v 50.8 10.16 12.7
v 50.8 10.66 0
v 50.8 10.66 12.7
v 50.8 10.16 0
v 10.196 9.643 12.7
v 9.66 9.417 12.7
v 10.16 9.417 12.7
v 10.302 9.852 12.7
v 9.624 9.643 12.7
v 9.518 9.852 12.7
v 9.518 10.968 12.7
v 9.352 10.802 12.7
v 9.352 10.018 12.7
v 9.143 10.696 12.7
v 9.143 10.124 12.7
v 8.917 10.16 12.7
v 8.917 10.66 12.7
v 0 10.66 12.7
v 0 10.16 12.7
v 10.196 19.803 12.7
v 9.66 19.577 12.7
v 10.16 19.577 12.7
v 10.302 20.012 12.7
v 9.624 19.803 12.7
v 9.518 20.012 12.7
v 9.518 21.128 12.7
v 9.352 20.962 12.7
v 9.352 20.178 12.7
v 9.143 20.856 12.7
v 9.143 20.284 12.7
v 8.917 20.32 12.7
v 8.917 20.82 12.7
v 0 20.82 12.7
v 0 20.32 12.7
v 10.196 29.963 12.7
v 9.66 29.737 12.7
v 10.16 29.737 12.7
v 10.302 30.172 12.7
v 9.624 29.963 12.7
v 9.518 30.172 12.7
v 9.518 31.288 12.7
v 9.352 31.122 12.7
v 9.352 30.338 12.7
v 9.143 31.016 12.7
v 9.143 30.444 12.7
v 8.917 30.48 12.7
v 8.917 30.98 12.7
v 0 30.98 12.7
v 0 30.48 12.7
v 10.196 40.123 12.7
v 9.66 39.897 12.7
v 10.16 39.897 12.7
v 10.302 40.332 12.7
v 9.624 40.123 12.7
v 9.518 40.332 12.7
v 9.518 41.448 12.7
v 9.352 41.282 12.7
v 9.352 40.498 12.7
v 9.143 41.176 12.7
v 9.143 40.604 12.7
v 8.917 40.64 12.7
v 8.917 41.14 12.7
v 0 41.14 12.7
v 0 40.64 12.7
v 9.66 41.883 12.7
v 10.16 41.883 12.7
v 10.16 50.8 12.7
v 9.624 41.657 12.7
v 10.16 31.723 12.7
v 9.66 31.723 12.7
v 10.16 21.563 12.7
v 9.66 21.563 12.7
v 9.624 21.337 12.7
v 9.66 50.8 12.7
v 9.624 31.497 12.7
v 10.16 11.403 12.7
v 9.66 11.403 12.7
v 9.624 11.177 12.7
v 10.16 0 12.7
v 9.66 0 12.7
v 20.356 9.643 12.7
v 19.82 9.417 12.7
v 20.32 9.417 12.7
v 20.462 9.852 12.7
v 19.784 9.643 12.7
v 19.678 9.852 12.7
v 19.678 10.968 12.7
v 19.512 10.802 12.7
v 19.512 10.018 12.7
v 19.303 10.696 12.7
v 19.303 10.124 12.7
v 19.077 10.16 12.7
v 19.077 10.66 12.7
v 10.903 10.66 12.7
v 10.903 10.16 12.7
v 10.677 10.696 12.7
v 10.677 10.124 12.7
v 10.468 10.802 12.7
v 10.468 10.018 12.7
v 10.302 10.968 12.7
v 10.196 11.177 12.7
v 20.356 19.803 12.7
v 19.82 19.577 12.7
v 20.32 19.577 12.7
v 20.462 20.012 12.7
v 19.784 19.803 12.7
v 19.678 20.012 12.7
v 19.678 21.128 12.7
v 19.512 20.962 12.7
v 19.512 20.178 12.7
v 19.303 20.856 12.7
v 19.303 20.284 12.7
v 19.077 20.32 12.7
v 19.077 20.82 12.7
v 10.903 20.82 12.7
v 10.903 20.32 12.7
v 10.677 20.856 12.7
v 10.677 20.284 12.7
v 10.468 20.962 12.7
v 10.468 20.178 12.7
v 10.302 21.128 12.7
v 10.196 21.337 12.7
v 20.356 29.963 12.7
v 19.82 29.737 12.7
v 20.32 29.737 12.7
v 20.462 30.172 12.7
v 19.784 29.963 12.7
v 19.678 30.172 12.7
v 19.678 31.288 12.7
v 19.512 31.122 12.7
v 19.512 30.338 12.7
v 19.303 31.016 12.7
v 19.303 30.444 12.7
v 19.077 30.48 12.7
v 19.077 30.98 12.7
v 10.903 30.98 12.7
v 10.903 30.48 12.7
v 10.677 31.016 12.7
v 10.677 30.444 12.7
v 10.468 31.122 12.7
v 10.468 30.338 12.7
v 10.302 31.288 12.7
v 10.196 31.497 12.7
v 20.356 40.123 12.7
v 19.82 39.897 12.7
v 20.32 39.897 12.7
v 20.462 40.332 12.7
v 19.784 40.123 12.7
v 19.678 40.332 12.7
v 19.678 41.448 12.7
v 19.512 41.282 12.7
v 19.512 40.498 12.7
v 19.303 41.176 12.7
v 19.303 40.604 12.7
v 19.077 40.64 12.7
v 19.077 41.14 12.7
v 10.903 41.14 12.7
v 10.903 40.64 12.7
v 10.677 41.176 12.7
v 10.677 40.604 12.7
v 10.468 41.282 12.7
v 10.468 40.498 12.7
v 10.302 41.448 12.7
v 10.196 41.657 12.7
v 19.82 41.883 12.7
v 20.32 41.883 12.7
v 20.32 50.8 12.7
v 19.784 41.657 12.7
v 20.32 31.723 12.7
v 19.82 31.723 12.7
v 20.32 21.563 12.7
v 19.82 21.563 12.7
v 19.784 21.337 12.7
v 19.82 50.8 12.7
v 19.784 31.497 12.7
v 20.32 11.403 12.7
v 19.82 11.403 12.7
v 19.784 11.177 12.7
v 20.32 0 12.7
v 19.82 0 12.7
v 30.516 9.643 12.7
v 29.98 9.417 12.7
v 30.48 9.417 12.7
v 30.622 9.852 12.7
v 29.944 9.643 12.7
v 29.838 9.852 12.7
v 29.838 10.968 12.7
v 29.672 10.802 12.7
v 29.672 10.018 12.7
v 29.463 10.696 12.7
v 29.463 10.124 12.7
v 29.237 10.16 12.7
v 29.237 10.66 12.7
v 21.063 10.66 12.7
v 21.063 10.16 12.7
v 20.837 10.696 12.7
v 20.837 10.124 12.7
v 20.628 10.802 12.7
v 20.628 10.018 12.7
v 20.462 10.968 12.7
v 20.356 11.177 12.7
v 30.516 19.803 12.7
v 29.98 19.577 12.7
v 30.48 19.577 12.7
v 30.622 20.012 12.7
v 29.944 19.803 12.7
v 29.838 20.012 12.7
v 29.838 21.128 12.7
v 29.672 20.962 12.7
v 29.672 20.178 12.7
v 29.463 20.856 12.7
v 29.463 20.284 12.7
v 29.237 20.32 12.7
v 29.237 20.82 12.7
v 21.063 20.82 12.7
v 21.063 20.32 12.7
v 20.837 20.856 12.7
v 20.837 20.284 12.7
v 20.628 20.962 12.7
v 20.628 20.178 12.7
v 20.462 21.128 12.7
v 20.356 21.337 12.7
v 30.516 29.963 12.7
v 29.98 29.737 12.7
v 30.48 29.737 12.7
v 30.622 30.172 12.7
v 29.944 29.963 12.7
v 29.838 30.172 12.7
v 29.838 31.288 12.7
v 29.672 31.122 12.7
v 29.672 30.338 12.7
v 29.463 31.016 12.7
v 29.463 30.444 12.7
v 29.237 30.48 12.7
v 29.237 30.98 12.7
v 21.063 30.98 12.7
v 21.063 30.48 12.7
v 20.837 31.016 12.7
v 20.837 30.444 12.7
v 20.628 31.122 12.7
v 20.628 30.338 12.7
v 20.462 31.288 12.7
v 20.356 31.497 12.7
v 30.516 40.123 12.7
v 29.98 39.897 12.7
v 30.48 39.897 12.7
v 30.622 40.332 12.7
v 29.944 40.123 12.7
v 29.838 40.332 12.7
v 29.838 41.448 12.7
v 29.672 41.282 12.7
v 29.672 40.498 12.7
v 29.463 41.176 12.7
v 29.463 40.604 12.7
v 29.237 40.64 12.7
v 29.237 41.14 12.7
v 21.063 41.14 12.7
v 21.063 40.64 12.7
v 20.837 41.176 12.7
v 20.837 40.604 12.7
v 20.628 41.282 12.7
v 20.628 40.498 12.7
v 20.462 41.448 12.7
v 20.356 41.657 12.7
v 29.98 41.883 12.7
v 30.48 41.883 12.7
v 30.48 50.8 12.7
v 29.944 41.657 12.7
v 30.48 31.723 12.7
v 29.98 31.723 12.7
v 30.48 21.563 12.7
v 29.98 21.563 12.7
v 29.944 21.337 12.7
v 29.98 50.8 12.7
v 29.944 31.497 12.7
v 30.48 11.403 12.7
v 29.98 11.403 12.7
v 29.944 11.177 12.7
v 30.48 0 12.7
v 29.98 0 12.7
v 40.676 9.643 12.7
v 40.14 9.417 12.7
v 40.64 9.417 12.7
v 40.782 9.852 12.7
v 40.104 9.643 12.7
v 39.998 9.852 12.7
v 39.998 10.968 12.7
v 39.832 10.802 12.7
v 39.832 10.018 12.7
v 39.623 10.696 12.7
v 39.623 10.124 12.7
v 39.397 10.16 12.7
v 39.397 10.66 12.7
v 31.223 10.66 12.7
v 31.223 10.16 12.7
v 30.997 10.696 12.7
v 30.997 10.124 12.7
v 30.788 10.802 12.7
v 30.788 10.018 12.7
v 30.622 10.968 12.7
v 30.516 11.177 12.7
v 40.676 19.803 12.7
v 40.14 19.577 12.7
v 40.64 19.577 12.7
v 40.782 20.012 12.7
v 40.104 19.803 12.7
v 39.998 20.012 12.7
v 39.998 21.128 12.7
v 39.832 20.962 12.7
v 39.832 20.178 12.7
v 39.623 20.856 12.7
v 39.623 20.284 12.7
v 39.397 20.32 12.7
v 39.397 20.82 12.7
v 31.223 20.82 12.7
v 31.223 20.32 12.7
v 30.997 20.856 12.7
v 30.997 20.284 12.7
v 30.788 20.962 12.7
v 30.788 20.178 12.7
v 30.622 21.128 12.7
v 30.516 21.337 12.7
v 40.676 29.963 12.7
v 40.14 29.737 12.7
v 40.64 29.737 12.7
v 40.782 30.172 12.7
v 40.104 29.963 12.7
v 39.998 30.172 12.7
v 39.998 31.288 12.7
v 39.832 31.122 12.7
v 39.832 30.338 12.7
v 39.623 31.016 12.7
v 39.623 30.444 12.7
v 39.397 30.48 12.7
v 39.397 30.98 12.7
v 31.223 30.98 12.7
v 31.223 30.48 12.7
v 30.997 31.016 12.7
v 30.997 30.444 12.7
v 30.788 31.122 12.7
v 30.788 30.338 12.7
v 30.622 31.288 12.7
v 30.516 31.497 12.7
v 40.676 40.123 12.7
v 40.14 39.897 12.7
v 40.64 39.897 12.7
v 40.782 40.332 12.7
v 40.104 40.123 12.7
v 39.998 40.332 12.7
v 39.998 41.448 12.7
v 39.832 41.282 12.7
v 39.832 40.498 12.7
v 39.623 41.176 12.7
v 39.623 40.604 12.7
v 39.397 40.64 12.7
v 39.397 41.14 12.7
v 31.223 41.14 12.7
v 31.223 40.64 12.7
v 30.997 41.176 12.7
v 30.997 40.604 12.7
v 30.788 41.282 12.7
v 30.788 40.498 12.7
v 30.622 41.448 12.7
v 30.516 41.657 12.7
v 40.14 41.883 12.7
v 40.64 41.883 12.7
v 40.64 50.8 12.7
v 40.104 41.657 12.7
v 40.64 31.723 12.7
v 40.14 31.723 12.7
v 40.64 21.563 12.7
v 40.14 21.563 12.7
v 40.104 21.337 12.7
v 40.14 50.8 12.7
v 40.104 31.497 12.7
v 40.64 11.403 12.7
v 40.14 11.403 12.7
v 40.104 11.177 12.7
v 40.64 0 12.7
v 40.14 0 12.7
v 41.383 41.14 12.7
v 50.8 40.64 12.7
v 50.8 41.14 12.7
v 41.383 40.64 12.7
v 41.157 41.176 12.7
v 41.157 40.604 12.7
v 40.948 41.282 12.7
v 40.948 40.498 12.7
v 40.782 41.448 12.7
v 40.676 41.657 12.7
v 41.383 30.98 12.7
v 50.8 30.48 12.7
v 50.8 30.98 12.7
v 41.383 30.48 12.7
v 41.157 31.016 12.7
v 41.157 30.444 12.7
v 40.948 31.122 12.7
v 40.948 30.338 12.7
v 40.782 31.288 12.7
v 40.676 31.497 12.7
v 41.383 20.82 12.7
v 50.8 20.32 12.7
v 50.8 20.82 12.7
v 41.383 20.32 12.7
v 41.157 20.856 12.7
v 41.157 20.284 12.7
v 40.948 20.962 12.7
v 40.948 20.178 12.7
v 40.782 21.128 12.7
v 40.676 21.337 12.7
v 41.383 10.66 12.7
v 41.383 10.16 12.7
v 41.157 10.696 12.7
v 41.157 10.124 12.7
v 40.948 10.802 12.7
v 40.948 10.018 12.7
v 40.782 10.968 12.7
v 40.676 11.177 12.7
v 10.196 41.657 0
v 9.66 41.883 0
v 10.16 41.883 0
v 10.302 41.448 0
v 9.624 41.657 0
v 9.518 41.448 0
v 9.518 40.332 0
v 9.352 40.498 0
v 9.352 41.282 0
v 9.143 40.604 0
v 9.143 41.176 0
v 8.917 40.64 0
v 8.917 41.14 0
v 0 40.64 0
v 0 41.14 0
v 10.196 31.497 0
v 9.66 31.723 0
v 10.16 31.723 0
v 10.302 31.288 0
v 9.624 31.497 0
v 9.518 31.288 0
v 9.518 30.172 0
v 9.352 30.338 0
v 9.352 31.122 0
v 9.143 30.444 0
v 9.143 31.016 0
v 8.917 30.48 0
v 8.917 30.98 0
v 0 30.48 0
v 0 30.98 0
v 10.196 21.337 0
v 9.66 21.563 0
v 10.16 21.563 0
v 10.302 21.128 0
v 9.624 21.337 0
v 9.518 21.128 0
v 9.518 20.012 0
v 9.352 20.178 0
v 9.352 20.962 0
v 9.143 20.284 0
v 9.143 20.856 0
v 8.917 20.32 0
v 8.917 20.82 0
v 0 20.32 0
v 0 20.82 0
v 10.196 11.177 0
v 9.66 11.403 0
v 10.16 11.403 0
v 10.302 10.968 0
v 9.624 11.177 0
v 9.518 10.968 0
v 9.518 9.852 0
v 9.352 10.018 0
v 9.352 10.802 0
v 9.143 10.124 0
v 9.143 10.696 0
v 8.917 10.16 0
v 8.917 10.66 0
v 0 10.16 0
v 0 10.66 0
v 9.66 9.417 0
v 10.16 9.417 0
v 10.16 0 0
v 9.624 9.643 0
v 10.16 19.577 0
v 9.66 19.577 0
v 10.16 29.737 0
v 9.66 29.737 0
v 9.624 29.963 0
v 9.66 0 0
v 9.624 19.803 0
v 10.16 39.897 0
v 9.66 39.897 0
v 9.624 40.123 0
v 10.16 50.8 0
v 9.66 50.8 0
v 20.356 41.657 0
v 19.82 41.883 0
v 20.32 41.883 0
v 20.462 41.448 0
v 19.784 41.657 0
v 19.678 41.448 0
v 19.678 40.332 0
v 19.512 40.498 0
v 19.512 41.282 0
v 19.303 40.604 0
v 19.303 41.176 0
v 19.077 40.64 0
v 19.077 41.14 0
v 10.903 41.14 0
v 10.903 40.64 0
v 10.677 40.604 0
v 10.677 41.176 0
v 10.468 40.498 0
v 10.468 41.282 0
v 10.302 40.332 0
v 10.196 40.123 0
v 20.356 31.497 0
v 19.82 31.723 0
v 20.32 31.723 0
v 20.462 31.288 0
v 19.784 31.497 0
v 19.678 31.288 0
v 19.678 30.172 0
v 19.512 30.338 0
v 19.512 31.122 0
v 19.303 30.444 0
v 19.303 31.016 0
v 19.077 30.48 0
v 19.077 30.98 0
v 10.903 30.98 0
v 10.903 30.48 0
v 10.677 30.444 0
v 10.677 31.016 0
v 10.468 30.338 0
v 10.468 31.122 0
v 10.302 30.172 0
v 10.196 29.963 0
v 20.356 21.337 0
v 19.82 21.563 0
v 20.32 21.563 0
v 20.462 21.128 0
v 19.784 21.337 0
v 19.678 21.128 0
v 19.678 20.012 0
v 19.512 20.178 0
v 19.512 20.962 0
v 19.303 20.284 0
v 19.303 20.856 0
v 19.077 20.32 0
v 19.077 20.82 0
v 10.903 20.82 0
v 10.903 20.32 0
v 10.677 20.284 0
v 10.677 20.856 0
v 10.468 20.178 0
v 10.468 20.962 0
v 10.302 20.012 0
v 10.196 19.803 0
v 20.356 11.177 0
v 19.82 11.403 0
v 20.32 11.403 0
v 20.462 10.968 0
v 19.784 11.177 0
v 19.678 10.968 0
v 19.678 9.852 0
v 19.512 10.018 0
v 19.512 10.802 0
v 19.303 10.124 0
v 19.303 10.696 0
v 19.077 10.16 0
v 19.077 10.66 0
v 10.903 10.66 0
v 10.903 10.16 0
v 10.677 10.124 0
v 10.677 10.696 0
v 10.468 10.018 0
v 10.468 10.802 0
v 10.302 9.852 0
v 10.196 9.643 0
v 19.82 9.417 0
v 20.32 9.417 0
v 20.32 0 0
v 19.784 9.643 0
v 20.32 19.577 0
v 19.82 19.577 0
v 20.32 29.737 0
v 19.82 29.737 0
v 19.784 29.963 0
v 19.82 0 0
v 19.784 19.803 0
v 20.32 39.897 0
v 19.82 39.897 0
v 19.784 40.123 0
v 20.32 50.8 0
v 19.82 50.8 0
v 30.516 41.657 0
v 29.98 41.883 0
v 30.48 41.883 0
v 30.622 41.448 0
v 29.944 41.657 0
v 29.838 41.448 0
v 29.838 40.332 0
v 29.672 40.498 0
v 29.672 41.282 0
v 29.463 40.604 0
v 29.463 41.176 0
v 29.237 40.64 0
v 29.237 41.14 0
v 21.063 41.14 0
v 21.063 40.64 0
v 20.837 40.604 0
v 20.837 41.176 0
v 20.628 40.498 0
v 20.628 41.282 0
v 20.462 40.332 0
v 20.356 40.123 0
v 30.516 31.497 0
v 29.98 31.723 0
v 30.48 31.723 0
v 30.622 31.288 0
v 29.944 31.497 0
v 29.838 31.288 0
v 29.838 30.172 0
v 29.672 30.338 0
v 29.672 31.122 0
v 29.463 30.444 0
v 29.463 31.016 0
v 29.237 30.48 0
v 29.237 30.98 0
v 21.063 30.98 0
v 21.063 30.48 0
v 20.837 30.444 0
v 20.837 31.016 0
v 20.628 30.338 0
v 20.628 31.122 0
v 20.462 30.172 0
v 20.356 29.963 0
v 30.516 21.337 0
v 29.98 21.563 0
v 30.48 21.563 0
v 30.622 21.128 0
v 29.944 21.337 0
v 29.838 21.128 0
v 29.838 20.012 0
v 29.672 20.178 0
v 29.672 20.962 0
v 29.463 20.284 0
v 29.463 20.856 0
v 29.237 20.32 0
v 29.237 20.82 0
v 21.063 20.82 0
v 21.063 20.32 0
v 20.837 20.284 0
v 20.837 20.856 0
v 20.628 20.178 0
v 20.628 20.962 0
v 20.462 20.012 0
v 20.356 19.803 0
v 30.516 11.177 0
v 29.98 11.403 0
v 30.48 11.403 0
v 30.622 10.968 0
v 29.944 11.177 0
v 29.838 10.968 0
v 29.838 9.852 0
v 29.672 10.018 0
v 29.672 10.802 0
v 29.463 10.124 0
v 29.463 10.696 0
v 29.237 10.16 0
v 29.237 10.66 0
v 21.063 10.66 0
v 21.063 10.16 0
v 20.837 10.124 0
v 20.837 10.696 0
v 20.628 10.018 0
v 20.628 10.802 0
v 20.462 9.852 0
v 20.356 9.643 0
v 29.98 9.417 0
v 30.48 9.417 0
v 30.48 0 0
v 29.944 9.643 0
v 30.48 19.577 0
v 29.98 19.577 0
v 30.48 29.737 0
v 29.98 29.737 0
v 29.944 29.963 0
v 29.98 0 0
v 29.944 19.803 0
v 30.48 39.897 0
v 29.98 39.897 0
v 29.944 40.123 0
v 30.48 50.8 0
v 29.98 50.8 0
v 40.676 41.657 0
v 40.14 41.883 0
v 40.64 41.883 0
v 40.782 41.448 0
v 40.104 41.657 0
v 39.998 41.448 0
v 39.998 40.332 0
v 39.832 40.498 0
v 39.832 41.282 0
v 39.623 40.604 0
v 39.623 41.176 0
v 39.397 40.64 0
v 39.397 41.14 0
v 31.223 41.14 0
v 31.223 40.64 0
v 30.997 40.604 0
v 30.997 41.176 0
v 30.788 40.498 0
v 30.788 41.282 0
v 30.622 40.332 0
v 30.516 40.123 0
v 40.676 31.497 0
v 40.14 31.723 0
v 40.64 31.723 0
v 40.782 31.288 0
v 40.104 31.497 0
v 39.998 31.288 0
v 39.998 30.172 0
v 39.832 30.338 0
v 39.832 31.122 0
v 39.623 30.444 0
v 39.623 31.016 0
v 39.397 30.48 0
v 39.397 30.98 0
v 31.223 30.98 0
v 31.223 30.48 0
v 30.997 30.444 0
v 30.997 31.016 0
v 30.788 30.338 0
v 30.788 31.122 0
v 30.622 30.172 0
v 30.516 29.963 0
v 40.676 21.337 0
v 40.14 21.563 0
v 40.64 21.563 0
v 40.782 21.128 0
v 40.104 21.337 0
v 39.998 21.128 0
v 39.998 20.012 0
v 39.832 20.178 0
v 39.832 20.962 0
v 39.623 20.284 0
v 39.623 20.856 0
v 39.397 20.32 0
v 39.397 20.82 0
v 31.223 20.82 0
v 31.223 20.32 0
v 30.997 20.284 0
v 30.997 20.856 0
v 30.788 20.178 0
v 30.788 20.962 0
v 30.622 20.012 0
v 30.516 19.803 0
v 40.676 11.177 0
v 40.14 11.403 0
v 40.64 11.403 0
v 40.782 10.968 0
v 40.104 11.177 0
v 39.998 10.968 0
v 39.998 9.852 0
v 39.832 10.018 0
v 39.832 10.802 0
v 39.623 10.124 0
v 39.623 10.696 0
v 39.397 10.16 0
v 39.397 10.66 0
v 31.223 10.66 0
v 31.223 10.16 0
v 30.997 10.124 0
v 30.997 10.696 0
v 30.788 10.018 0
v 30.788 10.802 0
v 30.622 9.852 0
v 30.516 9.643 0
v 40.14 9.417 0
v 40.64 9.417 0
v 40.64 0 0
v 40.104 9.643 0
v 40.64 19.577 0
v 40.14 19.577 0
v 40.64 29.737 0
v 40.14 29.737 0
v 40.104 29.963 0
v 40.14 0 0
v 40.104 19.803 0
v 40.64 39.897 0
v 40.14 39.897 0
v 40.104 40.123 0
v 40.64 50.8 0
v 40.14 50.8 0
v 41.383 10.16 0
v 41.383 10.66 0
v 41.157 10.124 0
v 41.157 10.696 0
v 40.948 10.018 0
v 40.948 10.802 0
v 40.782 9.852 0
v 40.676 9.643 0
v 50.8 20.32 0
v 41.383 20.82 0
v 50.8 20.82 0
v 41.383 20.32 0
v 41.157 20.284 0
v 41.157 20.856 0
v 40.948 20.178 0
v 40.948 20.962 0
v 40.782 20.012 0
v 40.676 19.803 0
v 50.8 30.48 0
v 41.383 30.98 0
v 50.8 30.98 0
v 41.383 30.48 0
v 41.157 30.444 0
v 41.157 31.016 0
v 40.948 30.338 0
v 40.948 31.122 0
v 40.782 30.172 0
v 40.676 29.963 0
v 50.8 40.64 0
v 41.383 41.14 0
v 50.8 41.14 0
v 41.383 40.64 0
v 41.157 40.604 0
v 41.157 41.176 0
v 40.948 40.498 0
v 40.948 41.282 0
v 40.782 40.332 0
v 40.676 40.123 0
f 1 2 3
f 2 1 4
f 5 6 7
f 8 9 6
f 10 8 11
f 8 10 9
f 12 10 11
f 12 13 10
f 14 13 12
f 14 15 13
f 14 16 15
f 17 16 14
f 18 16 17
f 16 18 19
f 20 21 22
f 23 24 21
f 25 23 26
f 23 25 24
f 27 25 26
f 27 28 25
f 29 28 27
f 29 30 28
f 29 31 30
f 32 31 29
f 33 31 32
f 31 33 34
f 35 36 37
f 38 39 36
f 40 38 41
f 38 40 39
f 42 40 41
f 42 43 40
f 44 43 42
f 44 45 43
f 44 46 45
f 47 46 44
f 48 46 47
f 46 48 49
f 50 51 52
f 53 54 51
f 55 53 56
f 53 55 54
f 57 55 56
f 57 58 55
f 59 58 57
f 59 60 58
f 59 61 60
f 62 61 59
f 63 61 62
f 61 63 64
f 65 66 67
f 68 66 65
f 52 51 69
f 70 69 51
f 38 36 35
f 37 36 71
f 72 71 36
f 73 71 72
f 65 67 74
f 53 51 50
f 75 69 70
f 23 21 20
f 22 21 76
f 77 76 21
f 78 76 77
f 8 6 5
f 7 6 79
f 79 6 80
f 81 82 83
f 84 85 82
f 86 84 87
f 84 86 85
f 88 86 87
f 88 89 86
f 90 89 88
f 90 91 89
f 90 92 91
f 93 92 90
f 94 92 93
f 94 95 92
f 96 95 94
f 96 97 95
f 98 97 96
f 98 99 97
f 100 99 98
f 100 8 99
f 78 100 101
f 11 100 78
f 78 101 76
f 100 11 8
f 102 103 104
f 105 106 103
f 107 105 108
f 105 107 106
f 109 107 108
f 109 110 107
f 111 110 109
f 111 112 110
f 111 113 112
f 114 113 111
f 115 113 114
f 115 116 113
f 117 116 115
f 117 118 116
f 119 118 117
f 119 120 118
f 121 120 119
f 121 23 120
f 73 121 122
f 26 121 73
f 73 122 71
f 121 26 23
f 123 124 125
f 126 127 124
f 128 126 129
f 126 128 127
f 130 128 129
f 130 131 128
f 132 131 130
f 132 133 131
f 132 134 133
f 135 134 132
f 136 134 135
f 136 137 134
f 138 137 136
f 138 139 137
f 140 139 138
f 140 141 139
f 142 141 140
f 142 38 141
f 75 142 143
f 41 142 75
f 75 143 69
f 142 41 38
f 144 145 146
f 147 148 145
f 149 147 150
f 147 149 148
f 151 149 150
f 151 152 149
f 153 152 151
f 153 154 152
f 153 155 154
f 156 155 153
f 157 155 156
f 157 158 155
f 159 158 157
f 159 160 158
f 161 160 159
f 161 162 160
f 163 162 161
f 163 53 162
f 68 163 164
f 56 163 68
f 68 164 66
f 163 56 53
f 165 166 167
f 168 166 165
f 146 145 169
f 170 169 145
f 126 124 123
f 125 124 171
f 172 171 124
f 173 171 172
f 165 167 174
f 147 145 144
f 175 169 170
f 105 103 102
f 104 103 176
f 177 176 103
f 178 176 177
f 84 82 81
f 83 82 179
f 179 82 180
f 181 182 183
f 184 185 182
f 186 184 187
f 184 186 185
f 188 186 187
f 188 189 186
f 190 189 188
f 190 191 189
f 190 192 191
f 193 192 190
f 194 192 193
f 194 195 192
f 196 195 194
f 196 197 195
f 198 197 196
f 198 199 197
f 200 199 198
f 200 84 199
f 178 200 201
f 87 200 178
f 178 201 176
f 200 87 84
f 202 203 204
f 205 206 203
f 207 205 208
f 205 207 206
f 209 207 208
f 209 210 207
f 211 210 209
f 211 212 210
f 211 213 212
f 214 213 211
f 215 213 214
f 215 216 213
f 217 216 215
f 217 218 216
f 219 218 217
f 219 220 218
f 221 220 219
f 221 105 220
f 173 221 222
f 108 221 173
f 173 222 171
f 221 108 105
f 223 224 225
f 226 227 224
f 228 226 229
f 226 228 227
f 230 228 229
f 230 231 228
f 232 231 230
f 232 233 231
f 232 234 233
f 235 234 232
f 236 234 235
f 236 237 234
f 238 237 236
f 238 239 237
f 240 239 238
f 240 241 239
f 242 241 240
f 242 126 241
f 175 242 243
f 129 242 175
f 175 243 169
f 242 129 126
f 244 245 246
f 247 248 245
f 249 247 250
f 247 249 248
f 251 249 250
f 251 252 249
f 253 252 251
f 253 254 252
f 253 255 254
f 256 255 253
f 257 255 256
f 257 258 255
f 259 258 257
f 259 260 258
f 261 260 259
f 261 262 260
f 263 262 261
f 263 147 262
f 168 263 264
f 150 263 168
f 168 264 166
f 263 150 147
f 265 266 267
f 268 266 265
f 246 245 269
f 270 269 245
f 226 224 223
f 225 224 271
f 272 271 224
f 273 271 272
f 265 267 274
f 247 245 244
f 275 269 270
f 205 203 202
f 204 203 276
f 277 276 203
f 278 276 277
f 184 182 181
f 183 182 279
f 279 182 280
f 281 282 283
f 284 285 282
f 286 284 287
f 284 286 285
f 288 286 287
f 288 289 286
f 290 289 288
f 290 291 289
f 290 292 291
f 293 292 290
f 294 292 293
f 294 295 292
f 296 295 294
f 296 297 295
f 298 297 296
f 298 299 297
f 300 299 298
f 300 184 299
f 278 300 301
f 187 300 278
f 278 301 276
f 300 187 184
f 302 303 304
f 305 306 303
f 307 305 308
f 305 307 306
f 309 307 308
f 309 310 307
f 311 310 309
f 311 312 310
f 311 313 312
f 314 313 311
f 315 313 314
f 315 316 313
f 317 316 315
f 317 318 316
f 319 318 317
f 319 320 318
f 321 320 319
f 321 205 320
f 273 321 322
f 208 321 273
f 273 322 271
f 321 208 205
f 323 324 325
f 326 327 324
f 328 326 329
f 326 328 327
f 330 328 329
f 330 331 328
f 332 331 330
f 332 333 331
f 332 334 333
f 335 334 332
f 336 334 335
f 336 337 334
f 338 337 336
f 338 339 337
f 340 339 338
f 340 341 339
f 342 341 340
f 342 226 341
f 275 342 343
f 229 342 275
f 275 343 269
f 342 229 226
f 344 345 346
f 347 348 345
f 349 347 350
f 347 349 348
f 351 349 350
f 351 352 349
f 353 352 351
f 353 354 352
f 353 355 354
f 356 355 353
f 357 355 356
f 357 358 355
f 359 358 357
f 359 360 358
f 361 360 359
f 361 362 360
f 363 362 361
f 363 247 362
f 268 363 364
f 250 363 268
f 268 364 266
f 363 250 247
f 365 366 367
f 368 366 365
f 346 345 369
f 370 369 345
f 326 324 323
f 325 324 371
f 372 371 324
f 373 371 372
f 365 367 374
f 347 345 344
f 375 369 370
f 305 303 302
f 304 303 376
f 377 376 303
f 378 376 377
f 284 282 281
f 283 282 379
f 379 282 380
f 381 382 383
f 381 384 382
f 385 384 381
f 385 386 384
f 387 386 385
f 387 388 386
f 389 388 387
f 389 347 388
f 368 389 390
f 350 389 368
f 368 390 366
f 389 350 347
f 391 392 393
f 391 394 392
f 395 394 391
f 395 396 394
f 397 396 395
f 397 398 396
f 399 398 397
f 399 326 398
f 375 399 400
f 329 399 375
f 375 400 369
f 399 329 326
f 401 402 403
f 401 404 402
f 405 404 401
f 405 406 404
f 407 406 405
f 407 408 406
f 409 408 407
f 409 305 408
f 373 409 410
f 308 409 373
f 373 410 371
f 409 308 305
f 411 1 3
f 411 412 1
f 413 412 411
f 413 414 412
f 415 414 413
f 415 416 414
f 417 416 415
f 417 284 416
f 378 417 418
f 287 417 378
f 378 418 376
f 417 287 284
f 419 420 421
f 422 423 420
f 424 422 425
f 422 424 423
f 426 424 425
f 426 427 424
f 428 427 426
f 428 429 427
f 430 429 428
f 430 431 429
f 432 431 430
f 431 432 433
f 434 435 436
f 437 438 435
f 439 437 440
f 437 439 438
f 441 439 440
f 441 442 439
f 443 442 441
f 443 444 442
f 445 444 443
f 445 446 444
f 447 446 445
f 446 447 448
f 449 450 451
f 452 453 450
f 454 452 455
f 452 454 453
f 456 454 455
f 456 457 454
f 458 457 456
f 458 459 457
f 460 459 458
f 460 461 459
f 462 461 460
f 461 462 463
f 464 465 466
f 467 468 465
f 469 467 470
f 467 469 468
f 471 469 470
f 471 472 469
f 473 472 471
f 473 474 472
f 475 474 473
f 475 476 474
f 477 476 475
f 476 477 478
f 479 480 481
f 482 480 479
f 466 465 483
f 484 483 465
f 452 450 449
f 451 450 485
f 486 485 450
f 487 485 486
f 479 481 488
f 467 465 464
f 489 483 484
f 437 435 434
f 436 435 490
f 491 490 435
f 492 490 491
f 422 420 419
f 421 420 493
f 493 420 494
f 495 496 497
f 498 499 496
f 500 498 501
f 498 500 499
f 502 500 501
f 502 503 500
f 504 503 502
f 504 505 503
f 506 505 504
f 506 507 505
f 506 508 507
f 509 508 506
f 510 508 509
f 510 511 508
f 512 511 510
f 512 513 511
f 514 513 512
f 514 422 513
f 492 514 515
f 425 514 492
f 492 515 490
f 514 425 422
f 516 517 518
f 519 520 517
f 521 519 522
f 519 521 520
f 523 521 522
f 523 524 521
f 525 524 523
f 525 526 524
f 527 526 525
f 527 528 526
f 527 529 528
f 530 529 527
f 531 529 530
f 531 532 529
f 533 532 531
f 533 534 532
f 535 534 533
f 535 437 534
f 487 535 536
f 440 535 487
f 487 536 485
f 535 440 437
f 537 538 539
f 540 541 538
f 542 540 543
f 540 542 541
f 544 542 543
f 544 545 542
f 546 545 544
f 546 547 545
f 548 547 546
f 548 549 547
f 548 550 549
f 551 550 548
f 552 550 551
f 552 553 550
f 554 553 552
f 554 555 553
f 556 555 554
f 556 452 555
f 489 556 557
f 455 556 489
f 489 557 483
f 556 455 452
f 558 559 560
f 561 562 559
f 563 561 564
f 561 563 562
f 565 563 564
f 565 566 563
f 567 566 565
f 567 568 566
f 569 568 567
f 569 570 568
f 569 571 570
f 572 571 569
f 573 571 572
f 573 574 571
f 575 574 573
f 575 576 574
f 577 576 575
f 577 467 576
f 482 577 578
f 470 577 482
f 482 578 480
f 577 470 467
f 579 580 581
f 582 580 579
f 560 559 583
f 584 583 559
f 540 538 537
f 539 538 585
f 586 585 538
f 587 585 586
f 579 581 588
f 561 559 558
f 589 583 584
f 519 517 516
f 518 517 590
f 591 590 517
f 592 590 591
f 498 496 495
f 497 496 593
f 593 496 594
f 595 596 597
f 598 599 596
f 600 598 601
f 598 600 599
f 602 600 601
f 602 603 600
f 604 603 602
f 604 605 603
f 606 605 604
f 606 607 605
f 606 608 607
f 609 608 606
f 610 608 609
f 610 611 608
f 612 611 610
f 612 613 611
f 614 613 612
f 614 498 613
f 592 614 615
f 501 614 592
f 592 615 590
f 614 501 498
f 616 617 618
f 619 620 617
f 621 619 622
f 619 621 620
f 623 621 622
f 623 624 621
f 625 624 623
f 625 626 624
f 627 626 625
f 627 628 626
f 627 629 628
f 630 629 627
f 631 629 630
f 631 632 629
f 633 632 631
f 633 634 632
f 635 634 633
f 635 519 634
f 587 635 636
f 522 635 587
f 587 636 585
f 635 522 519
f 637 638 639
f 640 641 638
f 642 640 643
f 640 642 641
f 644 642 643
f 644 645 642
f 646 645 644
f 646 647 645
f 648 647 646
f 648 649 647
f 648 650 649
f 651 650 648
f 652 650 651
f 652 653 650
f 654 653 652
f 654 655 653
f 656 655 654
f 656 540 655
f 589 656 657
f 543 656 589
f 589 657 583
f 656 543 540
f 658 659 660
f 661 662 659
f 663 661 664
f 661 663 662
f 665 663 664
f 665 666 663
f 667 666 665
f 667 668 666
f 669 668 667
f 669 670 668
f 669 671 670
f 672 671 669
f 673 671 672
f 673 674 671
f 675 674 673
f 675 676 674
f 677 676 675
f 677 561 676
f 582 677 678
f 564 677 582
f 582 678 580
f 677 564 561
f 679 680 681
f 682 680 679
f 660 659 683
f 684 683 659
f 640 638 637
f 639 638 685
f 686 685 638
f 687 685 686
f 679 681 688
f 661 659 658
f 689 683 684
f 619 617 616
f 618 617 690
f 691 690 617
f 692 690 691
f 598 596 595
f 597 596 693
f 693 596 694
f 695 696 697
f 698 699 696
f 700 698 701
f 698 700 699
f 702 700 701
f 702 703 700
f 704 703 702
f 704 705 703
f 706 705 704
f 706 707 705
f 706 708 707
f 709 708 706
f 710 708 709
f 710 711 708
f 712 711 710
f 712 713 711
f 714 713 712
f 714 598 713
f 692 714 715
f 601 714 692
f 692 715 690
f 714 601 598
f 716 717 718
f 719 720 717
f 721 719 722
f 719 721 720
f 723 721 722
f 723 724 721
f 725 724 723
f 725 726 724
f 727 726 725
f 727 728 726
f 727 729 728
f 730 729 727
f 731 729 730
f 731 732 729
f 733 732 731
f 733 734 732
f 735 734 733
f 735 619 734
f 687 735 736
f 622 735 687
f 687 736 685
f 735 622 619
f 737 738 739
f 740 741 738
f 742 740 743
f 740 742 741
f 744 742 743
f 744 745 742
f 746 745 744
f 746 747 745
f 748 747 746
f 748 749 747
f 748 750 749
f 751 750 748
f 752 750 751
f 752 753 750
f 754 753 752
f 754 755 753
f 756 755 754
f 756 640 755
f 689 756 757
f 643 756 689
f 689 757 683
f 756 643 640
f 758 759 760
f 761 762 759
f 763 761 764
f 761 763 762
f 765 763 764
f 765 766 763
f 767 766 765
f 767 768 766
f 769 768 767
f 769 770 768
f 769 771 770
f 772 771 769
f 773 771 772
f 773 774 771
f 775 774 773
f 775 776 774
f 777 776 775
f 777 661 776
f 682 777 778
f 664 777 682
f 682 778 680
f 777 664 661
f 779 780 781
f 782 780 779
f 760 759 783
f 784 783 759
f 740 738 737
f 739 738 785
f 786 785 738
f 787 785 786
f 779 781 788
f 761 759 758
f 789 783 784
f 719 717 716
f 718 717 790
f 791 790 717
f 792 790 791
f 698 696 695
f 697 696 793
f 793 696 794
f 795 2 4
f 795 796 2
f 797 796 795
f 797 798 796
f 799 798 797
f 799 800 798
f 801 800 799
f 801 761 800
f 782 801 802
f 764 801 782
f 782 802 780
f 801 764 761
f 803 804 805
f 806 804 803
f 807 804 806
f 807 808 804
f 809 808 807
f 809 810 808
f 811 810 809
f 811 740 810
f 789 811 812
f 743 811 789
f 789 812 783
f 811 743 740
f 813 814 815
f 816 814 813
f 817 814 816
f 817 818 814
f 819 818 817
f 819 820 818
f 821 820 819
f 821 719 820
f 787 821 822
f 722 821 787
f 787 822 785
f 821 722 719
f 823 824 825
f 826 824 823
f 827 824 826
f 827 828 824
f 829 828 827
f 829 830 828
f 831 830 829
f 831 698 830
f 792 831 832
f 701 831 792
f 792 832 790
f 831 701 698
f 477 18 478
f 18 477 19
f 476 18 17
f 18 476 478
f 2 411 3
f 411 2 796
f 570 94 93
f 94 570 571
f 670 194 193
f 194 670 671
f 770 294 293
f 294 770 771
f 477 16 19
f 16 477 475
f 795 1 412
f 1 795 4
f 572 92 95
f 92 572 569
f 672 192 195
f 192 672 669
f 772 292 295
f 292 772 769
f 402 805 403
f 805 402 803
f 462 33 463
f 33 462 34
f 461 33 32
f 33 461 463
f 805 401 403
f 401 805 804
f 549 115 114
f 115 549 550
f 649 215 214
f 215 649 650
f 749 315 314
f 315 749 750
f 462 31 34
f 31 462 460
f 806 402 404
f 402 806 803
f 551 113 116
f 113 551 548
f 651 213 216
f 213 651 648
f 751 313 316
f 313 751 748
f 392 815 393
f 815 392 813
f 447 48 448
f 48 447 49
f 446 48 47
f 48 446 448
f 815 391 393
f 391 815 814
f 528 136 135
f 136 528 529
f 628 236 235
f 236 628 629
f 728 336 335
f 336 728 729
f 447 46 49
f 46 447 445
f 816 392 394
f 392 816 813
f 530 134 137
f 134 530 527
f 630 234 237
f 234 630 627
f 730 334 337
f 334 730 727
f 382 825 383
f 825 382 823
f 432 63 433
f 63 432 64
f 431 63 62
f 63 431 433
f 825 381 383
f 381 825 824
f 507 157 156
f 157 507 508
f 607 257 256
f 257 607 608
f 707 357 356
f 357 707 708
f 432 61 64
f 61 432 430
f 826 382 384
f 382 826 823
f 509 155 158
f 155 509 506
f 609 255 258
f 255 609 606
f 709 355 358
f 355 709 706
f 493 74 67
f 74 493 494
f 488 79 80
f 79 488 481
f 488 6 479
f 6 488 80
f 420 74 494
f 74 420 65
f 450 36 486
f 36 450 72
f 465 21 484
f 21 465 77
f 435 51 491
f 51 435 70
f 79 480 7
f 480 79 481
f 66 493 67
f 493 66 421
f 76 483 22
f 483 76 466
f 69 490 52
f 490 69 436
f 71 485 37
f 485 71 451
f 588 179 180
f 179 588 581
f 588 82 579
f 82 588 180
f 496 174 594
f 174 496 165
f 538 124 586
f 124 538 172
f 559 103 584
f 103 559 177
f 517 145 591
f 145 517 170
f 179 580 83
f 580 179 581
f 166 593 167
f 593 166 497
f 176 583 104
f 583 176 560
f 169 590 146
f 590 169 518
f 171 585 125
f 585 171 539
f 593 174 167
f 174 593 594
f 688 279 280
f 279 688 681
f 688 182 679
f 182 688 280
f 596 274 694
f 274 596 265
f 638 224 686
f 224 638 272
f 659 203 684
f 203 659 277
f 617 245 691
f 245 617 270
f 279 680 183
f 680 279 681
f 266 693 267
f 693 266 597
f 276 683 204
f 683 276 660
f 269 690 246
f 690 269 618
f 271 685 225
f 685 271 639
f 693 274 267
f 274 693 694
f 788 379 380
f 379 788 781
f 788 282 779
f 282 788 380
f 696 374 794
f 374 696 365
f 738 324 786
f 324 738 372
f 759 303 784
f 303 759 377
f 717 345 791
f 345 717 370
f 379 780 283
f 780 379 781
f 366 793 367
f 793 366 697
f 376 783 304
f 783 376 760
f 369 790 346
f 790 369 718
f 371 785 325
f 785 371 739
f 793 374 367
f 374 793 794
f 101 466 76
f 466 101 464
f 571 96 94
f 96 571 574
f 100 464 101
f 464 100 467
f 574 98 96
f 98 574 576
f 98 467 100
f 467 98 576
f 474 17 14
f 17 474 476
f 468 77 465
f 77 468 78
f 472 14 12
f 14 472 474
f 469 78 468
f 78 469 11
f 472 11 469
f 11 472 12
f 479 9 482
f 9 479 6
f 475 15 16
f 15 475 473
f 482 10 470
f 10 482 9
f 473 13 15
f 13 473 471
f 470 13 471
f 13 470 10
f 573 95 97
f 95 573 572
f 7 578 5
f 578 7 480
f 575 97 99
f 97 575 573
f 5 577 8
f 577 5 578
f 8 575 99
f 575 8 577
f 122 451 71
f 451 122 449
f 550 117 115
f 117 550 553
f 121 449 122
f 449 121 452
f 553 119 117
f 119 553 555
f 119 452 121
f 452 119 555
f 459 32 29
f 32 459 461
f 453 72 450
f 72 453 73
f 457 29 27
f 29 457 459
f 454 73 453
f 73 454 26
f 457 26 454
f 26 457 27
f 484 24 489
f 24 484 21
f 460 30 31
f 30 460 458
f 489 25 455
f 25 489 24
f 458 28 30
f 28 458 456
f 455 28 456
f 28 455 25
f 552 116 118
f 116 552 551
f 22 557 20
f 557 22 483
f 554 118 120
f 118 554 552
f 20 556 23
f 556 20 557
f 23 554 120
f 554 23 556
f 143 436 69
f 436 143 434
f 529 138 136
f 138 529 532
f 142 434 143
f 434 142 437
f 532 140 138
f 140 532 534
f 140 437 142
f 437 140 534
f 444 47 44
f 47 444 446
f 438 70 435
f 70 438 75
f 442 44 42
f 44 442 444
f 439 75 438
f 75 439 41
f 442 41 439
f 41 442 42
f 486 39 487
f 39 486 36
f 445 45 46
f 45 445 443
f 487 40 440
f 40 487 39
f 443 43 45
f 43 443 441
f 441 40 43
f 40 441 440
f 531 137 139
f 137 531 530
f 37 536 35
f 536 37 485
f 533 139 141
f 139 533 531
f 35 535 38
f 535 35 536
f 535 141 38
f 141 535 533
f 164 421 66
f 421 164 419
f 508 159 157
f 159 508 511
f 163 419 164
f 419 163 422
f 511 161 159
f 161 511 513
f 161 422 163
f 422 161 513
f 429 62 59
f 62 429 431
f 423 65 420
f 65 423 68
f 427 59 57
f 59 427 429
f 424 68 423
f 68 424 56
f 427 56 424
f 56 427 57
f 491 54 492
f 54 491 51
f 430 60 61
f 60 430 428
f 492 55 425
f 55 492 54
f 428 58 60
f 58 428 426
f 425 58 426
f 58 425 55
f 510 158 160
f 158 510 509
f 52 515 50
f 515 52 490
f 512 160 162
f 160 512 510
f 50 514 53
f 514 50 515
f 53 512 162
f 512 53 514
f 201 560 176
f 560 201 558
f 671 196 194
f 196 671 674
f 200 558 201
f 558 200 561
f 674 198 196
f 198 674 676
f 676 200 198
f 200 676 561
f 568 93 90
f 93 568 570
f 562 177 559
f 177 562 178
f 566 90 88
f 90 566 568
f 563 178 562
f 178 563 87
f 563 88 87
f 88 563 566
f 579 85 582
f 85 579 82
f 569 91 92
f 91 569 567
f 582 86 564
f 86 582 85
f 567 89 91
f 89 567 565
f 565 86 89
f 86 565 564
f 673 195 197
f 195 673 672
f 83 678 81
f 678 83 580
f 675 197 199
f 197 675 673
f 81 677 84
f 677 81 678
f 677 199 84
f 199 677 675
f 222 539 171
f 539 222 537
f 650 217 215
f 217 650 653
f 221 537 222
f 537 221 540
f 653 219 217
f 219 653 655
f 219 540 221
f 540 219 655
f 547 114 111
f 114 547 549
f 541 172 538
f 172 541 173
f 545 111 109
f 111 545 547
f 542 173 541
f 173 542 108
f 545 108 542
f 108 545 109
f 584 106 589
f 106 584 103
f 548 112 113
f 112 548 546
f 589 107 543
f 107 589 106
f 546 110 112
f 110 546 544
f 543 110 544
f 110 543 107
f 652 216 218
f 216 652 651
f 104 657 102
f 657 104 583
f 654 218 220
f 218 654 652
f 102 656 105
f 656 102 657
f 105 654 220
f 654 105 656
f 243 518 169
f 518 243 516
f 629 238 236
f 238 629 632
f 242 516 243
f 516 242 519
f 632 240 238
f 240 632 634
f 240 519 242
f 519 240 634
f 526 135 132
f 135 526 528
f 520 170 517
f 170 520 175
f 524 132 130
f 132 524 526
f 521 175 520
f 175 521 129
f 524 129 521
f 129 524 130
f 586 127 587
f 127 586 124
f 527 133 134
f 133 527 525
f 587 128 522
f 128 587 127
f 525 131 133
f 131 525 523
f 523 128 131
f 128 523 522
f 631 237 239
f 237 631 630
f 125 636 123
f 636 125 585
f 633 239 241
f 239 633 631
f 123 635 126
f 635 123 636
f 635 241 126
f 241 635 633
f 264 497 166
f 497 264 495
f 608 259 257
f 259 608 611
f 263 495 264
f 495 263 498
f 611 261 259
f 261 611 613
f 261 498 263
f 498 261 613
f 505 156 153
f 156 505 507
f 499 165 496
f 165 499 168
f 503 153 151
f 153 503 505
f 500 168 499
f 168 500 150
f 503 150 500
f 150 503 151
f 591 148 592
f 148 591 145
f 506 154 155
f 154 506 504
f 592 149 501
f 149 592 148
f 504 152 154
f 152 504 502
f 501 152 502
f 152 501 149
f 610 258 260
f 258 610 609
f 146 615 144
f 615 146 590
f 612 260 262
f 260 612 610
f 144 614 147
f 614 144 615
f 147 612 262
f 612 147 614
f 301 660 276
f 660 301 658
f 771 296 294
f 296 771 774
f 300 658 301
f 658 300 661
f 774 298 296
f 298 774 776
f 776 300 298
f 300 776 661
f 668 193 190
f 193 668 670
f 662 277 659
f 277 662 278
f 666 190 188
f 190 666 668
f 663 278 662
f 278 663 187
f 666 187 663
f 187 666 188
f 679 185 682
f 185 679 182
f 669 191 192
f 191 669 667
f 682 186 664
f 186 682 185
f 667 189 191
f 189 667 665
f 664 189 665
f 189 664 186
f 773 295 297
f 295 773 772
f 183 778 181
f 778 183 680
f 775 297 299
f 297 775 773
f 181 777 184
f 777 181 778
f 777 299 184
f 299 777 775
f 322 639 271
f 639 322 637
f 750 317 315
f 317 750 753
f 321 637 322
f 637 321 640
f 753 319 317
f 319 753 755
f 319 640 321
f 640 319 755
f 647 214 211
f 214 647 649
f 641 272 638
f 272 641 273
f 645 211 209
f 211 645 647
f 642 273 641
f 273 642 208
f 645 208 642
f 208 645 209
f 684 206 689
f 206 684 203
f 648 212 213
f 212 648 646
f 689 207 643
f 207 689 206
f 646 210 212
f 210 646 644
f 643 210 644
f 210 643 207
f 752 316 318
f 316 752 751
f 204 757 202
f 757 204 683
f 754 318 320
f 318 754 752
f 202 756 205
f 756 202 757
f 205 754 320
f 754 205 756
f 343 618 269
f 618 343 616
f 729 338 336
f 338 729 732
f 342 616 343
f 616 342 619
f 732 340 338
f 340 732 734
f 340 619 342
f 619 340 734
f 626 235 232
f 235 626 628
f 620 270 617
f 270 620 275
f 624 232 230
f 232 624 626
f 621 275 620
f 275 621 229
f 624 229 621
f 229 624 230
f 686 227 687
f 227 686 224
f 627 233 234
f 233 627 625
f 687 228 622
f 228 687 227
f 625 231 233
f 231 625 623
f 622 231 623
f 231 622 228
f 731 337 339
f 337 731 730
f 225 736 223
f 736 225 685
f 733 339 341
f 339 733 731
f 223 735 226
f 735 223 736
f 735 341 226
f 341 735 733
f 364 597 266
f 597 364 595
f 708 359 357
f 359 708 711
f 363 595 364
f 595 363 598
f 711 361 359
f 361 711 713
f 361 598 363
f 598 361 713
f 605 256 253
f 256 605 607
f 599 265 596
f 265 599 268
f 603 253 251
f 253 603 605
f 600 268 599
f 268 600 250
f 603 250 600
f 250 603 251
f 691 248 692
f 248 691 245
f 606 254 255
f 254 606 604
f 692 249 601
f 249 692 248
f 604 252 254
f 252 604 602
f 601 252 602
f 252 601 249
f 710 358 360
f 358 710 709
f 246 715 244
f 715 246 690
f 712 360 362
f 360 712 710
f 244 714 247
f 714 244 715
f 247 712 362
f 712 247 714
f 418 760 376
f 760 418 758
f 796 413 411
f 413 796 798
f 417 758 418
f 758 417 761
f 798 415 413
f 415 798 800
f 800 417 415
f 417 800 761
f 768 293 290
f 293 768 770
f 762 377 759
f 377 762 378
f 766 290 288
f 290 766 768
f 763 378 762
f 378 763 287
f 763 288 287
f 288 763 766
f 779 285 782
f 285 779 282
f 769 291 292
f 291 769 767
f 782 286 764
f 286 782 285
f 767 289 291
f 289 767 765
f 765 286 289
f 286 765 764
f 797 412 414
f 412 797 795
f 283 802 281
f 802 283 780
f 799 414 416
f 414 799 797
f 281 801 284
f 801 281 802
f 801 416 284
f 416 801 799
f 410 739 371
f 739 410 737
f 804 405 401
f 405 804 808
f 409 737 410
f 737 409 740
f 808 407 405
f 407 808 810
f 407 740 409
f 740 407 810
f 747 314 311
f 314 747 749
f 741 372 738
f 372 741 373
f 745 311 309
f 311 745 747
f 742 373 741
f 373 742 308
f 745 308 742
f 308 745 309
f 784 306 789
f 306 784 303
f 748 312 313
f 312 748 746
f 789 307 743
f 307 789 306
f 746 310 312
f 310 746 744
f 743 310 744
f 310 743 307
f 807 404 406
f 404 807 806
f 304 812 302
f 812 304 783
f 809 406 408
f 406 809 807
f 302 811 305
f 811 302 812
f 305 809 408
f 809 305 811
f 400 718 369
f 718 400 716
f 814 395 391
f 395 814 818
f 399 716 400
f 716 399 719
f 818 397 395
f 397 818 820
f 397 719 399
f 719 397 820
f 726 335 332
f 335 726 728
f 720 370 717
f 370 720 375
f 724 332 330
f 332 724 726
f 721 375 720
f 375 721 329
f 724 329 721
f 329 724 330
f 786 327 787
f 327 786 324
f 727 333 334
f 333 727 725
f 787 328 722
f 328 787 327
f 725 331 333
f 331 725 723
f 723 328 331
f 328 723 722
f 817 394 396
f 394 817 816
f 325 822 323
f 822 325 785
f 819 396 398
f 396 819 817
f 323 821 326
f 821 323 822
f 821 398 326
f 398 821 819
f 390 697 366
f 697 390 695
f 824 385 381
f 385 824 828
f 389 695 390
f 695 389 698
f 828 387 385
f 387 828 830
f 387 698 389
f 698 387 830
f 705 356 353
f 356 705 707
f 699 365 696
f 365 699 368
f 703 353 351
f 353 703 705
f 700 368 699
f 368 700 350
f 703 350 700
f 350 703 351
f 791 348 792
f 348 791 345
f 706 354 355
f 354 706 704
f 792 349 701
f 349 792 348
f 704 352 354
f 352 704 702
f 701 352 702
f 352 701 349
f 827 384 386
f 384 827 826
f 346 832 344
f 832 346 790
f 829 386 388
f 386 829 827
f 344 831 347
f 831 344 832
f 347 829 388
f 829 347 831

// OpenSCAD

height=12.7;				//divider height
width=50.8;			//container width
depth=50.8;			//container depth
row_dividers=4;		//# row dividers
column_dividers=4;	//# column dividers
fillet_diam=1.5;	   //fillet diameter 
wall_thickness=0.5;		//wall thickness

ff=0.001*1;				//fudge factor to create a closed manifold



union()
{

//// Dividers

	for(j = [0:row_dividers - 1])
	{
		translate([0,(depth/(row_dividers+1))+j*(depth/(row_dividers+1)),0]) cube([width,wall_thickness,height]);
	}

	for(k = [0:column_dividers - 1])
	{
		rotate([0,0,90]) translate([0,-(width/(column_dividers+1))-k*(width/(column_dividers+1)),0]) cube([depth,wall_thickness,height]);
	}

//// Fillets

	for(m = [0:column_dividers - 1])
	{
		for(n = [0:row_dividers - 1])
		{
			//// Upper right fillet
			translate([(width/(column_dividers+1))+m*(width/(column_dividers+1))-ff,(depth/(row_dividers+1))+n*(depth/(row_dividers+1))+wall_thickness-ff,0]) fillet();

			//// Upper left fillet
			translate([(width/(column_dividers+1))+m*(width/(column_dividers+1))-wall_thickness+ff,(depth/(row_dividers+1))+n*(depth/(row_dividers+1))+wall_thickness-ff,0]) rotate([0,0,90]) fillet();

			//// Lower left fillet
			translate([(width/(column_dividers+1))+m*(width/(column_dividers+1))-wall_thickness+ff,(depth/(row_dividers+1))+n*(depth/(row_dividers+1))+ff,0]) rotate([0,0,180]) fillet();

			//// Lower right fillet
			translate([(width/(column_dividers+1))+m*(width/(column_dividers+1))-ff,(depth/(row_dividers+1))+n*(depth/(row_dividers+1))+ff,0]) rotate([0,0,270]) fillet();

		}
	}

};



//////////// module definitions ///////////////////////

module fillet() 
{
	difference()
	{
		cube([fillet_diam/2,fillet_diam/2,height]);
		translate([fillet_diam/2,fillet_diam/2,0]) cylinder(h=(height+1)*2,r=fillet_diam/2,center=true,$fn=20);
	}
};
